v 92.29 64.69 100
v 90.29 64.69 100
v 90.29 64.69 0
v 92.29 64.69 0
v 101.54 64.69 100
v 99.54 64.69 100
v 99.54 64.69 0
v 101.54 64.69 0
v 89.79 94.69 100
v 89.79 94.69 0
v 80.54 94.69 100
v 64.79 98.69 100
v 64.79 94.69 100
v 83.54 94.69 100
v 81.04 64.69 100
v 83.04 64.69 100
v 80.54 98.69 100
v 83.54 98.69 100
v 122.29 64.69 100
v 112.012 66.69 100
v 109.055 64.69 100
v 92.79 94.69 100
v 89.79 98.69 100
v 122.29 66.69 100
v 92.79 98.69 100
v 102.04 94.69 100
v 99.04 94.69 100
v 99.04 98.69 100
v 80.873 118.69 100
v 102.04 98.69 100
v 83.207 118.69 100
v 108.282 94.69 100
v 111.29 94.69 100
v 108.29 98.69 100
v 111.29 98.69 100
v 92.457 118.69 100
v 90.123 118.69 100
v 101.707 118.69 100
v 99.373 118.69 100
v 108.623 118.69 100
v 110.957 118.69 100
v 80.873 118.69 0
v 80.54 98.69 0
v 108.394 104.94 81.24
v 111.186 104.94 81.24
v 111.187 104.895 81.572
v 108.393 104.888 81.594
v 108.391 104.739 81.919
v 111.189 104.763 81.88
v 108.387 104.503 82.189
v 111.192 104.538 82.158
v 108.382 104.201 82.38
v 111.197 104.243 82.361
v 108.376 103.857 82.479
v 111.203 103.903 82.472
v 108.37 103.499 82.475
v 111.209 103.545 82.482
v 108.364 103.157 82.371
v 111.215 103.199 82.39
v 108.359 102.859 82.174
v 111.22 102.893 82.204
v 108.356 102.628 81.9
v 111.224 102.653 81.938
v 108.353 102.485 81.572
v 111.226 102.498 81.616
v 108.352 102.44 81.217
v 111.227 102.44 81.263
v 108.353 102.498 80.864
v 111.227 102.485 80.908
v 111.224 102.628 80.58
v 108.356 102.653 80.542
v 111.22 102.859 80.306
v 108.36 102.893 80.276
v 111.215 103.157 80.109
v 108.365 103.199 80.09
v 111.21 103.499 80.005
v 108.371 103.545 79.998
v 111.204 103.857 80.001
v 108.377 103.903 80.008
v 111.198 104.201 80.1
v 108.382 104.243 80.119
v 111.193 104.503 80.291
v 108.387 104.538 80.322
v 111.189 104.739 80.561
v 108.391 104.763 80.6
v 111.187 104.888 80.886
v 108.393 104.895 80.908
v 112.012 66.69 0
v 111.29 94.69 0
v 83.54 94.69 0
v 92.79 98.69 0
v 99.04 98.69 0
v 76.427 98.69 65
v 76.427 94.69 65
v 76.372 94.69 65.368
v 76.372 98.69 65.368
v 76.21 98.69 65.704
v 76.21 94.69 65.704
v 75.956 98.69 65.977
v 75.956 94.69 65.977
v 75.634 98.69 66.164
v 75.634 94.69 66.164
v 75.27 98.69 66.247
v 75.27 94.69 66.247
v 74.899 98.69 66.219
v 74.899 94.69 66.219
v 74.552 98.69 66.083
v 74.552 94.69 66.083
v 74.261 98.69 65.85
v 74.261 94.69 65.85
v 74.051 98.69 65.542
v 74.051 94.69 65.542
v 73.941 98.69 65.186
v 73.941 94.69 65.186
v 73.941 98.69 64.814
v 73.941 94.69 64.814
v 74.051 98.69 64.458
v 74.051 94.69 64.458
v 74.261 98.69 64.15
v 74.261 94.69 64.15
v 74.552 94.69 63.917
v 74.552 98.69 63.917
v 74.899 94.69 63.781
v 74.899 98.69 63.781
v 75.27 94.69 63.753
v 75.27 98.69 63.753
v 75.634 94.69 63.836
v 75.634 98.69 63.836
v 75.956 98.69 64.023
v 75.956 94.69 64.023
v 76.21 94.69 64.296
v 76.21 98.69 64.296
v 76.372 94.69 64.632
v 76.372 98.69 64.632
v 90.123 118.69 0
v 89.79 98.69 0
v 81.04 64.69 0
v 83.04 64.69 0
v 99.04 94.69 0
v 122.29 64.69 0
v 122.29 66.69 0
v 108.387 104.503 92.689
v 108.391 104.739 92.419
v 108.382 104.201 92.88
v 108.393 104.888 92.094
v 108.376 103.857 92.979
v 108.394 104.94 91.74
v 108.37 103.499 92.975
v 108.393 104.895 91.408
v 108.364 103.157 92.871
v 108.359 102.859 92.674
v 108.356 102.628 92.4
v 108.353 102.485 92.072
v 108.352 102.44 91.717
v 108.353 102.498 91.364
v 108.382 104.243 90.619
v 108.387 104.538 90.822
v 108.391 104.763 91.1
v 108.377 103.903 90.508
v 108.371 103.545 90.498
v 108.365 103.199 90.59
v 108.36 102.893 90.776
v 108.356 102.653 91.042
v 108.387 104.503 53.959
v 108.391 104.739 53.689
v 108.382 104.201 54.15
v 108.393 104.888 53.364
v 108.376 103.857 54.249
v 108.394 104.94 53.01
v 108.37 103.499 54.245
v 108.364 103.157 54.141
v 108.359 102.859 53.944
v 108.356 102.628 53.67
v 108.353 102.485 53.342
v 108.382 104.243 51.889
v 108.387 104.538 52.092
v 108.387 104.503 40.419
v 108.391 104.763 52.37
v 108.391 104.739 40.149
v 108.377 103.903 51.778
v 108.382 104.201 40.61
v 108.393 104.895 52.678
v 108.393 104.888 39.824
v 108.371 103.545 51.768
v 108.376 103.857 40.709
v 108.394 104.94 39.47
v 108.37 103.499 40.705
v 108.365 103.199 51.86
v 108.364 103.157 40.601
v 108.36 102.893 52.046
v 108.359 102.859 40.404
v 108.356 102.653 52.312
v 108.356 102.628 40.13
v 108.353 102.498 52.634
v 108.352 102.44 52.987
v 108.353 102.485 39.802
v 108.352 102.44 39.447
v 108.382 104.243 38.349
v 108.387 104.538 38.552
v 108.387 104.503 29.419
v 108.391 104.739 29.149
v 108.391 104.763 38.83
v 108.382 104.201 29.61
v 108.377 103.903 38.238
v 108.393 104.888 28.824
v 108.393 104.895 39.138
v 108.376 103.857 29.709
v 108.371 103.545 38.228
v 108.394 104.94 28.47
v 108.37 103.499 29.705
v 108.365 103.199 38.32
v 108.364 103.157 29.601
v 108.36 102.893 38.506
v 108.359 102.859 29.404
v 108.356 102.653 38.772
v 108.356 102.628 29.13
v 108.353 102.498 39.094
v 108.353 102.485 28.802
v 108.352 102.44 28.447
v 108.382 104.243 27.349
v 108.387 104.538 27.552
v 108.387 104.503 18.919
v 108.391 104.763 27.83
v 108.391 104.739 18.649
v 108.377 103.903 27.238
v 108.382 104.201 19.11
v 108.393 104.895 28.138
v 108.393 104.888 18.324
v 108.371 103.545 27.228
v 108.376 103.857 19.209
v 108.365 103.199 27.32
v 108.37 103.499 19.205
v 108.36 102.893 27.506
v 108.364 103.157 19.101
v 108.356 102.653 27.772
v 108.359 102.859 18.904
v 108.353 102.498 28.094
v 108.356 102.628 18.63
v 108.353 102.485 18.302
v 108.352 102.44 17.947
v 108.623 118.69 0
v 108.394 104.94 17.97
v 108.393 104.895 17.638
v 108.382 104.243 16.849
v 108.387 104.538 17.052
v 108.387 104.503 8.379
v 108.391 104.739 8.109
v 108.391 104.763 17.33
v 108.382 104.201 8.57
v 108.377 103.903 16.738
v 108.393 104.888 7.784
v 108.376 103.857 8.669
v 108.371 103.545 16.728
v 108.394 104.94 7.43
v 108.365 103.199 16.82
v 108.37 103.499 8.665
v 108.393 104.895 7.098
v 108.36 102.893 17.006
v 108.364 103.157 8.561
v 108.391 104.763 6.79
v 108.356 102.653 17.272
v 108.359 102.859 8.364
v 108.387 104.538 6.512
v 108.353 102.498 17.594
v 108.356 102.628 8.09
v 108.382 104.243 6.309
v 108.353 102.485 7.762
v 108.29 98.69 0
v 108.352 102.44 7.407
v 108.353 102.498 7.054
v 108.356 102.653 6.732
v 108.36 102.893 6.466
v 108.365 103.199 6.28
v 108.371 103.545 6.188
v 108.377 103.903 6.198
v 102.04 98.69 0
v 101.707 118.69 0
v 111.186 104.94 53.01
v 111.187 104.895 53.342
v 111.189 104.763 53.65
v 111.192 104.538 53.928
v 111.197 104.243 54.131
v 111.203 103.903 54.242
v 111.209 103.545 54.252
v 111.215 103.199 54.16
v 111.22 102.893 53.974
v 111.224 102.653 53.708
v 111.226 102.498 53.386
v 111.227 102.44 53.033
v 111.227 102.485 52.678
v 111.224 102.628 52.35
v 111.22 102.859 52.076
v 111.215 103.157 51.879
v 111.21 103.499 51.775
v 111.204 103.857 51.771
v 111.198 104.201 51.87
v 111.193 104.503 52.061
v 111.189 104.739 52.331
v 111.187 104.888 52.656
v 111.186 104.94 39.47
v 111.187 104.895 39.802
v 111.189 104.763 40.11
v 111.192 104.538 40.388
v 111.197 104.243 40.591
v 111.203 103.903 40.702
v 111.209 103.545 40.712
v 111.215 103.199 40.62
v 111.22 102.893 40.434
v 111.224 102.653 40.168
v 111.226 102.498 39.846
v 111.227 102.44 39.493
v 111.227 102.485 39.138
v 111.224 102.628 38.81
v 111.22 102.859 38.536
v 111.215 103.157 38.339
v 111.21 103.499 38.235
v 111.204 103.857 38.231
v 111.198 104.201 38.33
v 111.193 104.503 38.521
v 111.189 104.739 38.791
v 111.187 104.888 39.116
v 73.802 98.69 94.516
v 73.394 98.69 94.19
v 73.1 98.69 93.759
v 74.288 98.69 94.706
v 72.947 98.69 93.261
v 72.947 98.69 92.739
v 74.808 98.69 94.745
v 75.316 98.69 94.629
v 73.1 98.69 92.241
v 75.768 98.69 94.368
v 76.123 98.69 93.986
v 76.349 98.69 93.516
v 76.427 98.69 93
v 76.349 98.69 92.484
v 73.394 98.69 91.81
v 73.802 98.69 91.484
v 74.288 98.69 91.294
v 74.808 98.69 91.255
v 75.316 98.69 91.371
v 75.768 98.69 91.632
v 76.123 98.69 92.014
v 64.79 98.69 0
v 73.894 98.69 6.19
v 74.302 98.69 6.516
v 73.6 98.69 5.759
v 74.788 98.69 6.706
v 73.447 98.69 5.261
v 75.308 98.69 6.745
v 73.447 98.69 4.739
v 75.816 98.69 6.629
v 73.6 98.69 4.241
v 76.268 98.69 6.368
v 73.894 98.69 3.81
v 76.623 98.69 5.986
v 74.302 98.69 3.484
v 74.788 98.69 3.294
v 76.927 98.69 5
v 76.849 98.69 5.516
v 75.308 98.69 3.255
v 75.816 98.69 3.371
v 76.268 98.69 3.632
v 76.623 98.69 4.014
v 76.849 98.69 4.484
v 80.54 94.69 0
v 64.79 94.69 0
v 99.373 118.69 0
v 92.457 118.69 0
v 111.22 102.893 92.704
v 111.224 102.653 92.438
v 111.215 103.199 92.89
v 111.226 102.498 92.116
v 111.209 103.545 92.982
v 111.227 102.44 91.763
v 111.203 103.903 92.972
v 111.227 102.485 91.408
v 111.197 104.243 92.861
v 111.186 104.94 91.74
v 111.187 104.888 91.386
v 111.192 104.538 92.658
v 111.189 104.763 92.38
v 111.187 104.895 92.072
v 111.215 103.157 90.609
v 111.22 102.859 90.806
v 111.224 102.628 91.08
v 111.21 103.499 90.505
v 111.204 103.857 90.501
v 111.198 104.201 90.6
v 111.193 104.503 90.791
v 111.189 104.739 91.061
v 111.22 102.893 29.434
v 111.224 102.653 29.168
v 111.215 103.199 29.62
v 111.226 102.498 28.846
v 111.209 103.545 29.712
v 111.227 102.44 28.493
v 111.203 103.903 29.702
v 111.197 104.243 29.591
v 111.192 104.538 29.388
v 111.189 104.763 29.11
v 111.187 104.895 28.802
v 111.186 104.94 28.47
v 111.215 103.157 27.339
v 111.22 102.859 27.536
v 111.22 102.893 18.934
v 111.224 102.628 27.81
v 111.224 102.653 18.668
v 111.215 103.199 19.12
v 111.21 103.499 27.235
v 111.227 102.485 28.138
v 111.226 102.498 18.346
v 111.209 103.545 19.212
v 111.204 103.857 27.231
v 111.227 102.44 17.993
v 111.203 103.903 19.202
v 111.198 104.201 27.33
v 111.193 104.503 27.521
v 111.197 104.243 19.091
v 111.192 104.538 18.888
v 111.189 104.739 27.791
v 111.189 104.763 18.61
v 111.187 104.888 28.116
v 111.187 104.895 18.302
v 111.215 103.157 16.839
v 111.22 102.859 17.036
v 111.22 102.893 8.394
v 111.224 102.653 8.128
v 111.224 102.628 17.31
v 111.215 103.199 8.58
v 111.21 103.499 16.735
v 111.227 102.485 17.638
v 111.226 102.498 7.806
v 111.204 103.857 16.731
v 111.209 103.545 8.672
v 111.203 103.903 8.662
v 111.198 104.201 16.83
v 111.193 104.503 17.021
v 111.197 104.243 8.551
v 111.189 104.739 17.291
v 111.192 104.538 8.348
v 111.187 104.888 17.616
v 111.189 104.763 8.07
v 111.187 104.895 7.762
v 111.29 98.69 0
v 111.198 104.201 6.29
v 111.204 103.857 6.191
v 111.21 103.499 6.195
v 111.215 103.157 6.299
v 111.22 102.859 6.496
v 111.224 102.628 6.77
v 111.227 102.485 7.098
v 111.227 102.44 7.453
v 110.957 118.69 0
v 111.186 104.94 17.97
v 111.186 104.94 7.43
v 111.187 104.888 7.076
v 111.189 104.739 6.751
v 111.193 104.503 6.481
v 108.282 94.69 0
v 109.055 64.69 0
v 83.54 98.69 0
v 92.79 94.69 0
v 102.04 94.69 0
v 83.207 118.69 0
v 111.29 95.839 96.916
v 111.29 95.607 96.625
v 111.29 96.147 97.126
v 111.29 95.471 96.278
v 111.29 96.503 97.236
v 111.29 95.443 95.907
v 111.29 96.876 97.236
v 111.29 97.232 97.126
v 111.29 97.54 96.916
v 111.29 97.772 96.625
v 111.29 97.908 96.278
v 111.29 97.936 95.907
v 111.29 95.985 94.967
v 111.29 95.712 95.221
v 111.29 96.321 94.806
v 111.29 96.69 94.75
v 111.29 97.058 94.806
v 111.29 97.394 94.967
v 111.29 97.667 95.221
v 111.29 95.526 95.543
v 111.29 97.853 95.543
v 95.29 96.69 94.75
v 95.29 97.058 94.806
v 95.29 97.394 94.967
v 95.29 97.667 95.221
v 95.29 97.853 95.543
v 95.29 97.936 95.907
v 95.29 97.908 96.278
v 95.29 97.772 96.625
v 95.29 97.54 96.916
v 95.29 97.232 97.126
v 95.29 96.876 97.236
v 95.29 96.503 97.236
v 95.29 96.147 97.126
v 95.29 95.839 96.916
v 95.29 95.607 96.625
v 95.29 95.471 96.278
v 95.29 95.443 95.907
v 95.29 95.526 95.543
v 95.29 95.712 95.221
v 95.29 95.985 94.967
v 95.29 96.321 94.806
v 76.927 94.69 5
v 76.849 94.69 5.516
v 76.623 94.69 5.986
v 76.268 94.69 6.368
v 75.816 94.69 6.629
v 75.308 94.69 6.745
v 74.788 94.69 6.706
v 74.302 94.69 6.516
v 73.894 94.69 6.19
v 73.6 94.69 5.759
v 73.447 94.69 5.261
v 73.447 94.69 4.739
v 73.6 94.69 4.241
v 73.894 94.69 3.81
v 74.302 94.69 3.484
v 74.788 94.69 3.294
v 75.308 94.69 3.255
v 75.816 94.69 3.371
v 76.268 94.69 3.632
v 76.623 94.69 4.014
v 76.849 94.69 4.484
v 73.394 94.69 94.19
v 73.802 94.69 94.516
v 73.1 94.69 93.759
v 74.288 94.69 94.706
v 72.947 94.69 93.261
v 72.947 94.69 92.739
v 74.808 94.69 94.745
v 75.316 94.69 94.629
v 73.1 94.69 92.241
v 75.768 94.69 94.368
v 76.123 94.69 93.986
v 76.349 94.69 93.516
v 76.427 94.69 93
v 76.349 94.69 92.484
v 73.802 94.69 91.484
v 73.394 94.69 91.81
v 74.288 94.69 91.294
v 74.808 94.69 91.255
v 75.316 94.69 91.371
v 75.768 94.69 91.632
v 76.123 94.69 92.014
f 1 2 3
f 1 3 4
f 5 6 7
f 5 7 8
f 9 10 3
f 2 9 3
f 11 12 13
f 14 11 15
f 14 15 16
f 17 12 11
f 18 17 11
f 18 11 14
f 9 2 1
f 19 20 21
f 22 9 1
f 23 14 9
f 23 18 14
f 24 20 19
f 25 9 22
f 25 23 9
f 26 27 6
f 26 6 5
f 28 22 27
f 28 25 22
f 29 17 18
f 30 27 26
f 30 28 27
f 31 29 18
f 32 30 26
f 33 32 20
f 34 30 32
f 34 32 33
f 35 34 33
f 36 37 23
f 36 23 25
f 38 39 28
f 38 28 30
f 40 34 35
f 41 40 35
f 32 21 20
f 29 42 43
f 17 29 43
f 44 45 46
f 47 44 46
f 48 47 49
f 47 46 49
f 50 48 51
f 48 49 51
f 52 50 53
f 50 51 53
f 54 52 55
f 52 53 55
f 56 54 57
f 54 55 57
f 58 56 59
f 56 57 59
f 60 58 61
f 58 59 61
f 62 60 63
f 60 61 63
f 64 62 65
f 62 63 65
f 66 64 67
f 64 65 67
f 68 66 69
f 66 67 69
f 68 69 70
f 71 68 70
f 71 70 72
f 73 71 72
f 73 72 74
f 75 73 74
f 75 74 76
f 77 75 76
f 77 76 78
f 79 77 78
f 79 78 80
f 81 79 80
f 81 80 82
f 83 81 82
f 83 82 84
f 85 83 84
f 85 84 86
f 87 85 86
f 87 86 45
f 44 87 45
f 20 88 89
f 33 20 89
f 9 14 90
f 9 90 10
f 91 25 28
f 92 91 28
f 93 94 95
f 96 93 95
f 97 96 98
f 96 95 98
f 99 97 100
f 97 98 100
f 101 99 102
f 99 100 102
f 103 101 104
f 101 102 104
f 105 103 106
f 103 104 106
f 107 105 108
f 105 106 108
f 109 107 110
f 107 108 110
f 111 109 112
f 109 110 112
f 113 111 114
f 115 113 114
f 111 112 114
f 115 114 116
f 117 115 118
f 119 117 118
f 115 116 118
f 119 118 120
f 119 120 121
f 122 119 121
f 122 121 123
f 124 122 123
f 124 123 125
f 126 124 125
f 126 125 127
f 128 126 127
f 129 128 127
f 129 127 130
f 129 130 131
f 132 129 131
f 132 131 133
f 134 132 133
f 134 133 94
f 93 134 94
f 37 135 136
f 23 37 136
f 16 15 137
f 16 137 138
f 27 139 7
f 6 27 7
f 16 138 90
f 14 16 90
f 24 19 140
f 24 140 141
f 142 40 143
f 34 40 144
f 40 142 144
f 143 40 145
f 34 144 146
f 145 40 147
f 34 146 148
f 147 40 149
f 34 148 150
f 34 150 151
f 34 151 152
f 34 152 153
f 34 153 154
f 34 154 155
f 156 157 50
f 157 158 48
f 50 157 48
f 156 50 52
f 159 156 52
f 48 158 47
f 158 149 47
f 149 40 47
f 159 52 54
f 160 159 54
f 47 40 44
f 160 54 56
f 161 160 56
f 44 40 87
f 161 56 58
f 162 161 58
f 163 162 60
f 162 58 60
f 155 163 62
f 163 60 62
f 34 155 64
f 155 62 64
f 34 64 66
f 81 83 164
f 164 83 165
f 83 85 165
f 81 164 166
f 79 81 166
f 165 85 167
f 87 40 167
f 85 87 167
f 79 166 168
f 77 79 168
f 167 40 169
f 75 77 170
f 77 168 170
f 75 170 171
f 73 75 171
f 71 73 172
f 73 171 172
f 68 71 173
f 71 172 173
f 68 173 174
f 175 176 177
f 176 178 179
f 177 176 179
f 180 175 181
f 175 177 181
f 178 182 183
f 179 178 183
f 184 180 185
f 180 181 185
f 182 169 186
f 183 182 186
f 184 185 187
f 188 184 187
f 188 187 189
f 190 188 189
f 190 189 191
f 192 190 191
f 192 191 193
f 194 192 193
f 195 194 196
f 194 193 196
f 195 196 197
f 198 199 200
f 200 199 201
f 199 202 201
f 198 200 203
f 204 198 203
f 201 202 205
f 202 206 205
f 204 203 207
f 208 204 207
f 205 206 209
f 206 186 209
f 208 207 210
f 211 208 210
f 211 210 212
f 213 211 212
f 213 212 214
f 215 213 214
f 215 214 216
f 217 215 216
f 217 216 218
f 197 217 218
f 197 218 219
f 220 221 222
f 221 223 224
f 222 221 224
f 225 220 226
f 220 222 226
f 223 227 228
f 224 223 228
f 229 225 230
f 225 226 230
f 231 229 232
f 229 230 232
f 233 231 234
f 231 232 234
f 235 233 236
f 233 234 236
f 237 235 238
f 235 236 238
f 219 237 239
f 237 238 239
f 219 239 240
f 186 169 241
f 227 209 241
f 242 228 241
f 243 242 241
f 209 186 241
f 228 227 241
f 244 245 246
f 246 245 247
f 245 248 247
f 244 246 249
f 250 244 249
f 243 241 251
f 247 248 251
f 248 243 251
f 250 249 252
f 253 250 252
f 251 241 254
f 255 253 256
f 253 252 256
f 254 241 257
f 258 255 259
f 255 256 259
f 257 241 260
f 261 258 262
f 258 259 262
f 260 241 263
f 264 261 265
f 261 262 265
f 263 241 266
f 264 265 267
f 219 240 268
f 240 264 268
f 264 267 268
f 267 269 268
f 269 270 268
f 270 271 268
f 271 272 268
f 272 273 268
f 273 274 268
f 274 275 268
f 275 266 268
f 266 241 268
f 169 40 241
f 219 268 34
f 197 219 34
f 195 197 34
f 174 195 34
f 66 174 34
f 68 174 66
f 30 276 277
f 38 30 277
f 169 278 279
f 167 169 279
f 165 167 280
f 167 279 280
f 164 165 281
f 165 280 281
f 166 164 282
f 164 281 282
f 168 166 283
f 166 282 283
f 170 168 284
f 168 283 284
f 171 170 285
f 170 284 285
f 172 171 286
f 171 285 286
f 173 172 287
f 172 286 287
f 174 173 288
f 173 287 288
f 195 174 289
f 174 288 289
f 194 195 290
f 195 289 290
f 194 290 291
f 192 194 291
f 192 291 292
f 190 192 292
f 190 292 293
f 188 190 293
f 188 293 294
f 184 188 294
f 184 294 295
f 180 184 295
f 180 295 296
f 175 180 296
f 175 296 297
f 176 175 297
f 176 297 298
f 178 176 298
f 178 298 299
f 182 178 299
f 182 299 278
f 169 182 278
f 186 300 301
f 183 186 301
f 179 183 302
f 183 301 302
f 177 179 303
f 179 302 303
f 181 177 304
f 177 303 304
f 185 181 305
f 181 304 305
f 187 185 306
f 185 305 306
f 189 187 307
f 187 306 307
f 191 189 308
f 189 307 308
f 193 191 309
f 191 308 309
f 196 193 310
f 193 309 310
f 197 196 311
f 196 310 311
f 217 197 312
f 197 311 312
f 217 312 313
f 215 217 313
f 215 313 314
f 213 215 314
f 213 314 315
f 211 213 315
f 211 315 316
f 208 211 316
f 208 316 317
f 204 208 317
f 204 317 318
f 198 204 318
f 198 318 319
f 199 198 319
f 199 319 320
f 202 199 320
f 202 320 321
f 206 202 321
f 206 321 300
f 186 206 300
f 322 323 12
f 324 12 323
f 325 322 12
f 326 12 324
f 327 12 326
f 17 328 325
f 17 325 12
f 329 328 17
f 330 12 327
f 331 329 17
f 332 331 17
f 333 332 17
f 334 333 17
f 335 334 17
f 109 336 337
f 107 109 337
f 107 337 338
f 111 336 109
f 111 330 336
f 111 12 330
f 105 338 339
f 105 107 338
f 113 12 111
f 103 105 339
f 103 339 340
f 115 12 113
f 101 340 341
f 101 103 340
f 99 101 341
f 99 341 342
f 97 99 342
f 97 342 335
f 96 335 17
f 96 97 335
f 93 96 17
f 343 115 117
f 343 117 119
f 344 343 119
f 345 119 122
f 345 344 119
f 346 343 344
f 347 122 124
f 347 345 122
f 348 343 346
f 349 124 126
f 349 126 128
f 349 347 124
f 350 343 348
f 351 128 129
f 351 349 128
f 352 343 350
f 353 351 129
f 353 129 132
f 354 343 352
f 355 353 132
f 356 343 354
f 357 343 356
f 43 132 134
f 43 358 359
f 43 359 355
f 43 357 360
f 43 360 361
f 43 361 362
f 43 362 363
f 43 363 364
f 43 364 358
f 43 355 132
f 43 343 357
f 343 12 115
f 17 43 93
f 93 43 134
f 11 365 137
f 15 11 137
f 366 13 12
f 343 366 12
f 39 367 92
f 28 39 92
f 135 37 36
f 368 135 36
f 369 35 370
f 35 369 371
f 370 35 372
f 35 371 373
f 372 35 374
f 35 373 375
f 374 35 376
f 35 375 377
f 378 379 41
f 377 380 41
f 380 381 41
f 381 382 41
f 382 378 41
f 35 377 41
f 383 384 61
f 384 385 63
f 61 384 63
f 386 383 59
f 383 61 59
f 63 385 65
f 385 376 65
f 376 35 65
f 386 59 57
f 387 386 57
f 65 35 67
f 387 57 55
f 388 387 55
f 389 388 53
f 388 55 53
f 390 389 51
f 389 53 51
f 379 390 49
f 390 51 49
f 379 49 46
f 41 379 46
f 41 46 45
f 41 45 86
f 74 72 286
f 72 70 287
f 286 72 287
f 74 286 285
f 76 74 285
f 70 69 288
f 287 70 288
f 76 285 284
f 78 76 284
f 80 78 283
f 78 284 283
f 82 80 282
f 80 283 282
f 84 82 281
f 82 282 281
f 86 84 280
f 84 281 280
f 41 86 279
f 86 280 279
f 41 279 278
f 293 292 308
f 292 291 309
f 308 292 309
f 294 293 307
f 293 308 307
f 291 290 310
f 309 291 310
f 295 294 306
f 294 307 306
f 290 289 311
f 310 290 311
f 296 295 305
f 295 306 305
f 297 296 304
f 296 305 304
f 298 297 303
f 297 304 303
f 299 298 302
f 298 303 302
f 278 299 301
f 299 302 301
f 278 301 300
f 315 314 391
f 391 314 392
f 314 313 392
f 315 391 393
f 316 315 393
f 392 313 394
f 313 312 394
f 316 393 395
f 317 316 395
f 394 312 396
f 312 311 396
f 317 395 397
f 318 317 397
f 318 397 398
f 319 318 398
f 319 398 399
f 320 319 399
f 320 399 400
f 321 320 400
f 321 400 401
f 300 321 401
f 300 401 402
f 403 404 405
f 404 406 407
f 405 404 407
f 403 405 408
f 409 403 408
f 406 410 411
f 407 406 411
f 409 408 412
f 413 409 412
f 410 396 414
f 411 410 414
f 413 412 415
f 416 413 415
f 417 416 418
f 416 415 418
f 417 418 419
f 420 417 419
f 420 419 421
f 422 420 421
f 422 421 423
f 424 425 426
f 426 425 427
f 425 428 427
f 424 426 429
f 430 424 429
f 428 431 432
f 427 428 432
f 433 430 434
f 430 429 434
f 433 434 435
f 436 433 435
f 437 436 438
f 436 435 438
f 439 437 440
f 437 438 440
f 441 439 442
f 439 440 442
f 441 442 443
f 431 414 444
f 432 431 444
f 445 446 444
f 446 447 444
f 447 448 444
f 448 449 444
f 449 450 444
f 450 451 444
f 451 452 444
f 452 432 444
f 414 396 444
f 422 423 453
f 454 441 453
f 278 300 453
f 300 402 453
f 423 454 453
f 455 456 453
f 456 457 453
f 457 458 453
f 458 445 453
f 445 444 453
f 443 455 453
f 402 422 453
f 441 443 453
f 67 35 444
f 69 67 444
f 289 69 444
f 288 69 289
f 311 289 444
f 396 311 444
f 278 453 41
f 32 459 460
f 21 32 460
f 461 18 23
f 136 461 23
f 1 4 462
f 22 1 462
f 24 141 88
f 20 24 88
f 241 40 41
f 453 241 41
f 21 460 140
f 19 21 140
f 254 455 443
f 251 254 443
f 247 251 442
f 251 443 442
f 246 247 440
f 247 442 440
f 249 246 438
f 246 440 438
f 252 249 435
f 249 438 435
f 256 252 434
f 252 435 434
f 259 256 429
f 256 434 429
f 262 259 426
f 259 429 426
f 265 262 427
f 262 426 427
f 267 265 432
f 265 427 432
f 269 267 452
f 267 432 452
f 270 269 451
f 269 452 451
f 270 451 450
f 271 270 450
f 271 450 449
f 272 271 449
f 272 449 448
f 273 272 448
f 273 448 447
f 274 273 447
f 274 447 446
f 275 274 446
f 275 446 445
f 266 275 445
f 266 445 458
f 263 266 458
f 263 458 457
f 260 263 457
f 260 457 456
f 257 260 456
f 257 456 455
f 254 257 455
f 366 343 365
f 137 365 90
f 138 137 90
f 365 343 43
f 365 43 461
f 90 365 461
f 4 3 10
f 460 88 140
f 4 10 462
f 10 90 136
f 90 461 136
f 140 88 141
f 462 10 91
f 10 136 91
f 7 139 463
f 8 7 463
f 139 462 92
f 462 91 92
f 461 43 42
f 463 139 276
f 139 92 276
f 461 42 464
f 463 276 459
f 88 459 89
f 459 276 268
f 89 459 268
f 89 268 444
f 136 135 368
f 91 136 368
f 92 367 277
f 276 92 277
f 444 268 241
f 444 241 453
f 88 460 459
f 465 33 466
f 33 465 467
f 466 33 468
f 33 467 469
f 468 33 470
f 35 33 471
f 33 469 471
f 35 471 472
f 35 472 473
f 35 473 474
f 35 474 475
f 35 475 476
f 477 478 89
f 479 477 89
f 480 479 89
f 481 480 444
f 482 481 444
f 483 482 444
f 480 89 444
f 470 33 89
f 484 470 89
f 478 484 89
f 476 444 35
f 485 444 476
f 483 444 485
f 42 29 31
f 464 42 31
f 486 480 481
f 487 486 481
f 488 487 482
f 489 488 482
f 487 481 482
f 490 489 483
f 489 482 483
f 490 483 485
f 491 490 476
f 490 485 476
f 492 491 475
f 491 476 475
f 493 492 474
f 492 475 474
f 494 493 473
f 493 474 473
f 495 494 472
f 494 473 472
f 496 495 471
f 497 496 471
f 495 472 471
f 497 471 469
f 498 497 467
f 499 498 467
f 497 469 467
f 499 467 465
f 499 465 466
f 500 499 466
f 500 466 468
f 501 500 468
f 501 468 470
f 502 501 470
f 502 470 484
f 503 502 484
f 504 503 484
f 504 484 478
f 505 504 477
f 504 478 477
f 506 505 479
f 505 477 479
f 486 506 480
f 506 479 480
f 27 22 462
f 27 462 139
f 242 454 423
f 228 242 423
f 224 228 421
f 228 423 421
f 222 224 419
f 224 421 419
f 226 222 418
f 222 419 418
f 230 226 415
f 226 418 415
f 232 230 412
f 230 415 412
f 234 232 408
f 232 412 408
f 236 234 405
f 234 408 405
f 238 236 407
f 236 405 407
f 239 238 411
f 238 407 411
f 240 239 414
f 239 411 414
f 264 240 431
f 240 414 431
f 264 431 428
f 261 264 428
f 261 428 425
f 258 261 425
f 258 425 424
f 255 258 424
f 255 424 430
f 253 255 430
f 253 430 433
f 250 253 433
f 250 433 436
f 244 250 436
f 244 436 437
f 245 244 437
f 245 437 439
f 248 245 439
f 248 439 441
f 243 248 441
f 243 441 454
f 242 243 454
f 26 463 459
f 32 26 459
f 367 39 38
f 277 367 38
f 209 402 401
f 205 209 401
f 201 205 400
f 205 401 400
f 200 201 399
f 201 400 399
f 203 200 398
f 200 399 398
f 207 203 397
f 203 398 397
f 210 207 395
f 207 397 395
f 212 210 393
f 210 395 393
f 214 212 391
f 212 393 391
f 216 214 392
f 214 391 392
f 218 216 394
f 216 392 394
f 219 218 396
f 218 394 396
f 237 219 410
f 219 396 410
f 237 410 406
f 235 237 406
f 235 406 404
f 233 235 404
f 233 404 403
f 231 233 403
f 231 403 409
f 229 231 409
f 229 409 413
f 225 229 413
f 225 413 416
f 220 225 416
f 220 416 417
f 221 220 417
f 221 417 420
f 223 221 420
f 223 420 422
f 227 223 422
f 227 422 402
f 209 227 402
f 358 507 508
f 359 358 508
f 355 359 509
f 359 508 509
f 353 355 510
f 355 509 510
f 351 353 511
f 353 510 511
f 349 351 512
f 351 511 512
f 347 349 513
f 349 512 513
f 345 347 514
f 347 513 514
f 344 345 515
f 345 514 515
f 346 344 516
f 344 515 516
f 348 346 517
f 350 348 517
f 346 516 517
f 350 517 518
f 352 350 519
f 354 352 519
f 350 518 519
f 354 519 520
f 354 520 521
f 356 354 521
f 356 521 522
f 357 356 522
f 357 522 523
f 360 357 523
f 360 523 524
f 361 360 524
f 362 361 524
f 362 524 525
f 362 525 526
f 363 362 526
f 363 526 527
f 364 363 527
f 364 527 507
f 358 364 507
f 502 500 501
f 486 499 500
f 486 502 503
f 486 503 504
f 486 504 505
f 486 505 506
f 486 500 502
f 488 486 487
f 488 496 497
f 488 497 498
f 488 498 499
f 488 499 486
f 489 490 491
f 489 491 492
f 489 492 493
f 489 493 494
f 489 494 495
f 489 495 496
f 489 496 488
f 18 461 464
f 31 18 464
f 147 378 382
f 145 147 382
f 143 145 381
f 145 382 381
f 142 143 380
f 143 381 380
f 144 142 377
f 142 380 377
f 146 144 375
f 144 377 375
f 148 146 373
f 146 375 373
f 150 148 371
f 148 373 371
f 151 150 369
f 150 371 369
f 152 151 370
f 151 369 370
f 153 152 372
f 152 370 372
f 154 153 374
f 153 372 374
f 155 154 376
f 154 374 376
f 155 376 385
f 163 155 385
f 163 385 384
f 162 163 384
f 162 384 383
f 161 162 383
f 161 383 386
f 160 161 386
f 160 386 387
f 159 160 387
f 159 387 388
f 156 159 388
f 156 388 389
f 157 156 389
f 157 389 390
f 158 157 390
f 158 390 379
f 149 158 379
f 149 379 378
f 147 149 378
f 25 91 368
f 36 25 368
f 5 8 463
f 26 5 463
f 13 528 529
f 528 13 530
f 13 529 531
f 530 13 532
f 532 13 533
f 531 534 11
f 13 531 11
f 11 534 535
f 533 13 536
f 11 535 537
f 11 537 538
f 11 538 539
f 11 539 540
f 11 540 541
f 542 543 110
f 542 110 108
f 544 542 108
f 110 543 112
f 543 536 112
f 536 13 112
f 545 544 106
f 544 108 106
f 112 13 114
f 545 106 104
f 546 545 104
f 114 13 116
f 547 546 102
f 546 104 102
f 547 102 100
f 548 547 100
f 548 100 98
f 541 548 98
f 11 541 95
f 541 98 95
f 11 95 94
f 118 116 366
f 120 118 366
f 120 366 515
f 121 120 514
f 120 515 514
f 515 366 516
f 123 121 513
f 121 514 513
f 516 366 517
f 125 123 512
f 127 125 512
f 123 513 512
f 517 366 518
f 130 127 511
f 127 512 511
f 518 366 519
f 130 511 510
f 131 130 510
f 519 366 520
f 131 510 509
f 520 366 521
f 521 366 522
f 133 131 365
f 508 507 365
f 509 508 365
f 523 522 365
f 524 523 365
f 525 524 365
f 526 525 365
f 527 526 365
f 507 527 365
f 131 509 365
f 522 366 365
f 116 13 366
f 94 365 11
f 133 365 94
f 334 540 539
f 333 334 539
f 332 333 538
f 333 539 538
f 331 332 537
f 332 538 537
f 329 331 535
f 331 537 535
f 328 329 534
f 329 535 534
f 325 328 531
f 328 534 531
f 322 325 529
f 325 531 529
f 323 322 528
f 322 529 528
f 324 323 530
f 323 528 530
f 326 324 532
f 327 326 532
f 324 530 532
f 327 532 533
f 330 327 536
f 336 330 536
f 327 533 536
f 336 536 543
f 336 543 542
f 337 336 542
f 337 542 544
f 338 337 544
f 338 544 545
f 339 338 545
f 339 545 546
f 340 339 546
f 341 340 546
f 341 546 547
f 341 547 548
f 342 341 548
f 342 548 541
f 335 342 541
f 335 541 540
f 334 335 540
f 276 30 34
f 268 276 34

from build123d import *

# Parameters (mm, degrees)
SKICA1_W                 = 93
SKICA1_H                 = 4
P_IDAT_VYSUNUT_M1_DEPTH  = 100
SKICA2_W                 = 121.490565888
SKICA2_H                 = 20.366839506
ODEBRAT_VYSUNUT_M1_DEPTH = 204.75436619
SKICA3_W                 = 67.97848113
SKICA3_H                 = 83.569638829
ODEBRAT_VYSUNUT_M2_DEPTH = 198.590610741
SKICA4_R                 = 1.25
ODEBRAT_VYSUNUT_M3_DEPTH = 5
SKICA5_R                 = 1.25
ODEBRAT_VYSUNUT_M4_DEPTH = 16
SKICA6_R                 = 1.25
ODEBRAT_VYSUNUT_M5_DEPTH = 5
SKICA7_R                 = 1.75
ODEBRAT_VYSUNUT_M6_DEPTH = 10


with BuildPart() as part:
    # Skica1 → Přidat vysunutím1 (new body)
    with BuildSketch(Plane.XY):
        Polygon((83.039921415, 64.689614429), (83.539921415, 94.689614429), (80.539921415, 94.689614429), (81.039921415, 64.689614429), align=None)
        Polygon((92.289921415, 64.689614429), (92.789921415, 94.689614429), (89.789921415, 94.689614429), (90.289921415, 64.689614429), align=None)
        Polygon((101.539921415, 64.689614429), (102.039921415, 94.689614429), (99.039921415, 94.689614429), (99.539921415, 64.689614429), align=None)
        Polygon((112.011784527, 66.689614429), (111.289921415, 94.689614429), (108.281882654, 94.689614429), (109.055307417, 64.689614429), (122.289921415, 64.689614429), (122.289921415, 66.689614429), align=None)
        Polygon((108.289921415, 98.689614429), (111.289921415, 98.689614429), (110.789921415, 128.689614429), (108.789921415, 128.689614429), align=None)
        Polygon((99.039921415, 98.689614429), (102.039921415, 98.689614429), (101.539921415, 128.689614429), (99.539921415, 128.689614429), align=None)
        Polygon((89.789921415, 98.689614429), (92.789921415, 98.689614429), (92.289921415, 128.689614429), (90.289921415, 128.689614429), align=None)
        Polygon((80.539921415, 98.689614429), (83.539921415, 98.689614429), (83.039921415, 128.689614429), (81.039921415, 128.689614429), align=None)
        with Locations((64.789921415, 96.689614429)):
            Rectangle(SKICA1_W, SKICA1_H)
        Polygon((27.539921415, 98.689614429), (30.539921415, 98.689614429), (30.039921415, 128.689614429), (28.039921415, 128.689614429), align=None)
        Polygon((36.789921415, 98.689614429), (39.789921415, 98.689614429), (39.289921415, 128.689614429), (37.289921415, 128.689614429), align=None)
        Polygon((46.039921415, 98.689614429), (49.039921415, 98.689614429), (48.539921415, 128.689614429), (46.539921415, 128.689614429), align=None)
        Polygon((18.289921415, 98.689614429), (21.289921415, 98.689614429), (20.789921415, 128.689614429), (18.789921415, 128.689614429), align=None)
        Polygon((20.524535413, 64.689614429), (21.297960175, 94.689614429), (18.289921415, 94.689614429), (17.568058303, 66.689614429), (7.289921415, 66.689614429), (7.289921415, 64.689614429), align=None)
        Polygon((30.039921415, 64.689614429), (30.539921415, 94.689614429), (27.539921415, 94.689614429), (28.039921415, 64.689614429), align=None)
        Polygon((39.289921415, 64.689614429), (39.789921415, 94.689614429), (36.789921415, 94.689614429), (37.289921415, 64.689614429), align=None)
        Polygon((48.539921415, 64.689614429), (49.039921415, 94.689614429), (46.039921415, 94.689614429), (46.539921415, 64.689614429), align=None)
    extrude(amount=P_IDAT_VYSUNUT_M1_DEPTH)

    # Skica2 → Odebrat vysunutím1 (cut, through all)
    with BuildSketch(Plane.XY.offset(100)):
        with Locations((69.111954217, 128.873034182)):
            Rectangle(SKICA2_W, SKICA2_H)
    extrude(amount=-ODEBRAT_VYSUNUT_M1_DEPTH, mode=Mode.SUBTRACT)

    # Skica3 → Odebrat vysunutím2 (cut, through all)
    with BuildSketch(Plane.XY.offset(100)):
        with Locations((30.80068085, 79.614929898)):
            Rectangle(SKICA3_W, SKICA3_H)
    extrude(amount=-ODEBRAT_VYSUNUT_M2_DEPTH, mode=Mode.SUBTRACT)

    # Skica4 → Odebrat vysunutím3 (cut)
    with BuildSketch(Plane(origin=(111.289921415, 0, 0), x_dir=(0, 0, -1), z_dir=(1, 0, 0))):
        with Locations(Location((-91.74, 103.689614429, 0), (0, 0, 90))):
            Circle(SKICA4_R)
        with Locations(Location((-81.24, 103.689614429, 0), (0, 0, 90))):
            Circle(SKICA4_R)
        with Locations(Location((-53.01, 103.689614429, 0), (0, 0, 90))):
            Circle(SKICA4_R)
        with Locations(Location((-28.47, 103.689614429, 0), (0, 0, 90))):
            Circle(SKICA4_R)
        with Locations(Location((-17.97, 103.689614429, 0), (0, 0, 90))):
            Circle(SKICA4_R)
        with Locations(Location((-7.43, 103.689614429, 0), (0, 0, 90))):
            Circle(SKICA4_R)
        with Locations(Location((-39.47, 103.689614429, 0), (0, 0, 90))):
            Circle(SKICA4_R)
    extrude(amount=-ODEBRAT_VYSUNUT_M3_DEPTH, mode=Mode.SUBTRACT)

    # Skica5 → Odebrat vysunutím4 (cut)
    with BuildSketch(Plane(origin=(111.289921415, 0, 0), x_dir=(0, 0, -1), z_dir=(1, 0, 0))):
        with Locations((-96, 96.689614429)):
            Circle(SKICA5_R)
    extrude(amount=-ODEBRAT_VYSUNUT_M4_DEPTH, mode=Mode.SUBTRACT)

    # Skica6 → Odebrat vysunutím5 (cut)
    with BuildSketch(Plane.XZ.offset(-94.689614429)):
        with Locations((74.677082764, 93)):
            Circle(SKICA6_R)
        with Locations((75.177082764, 5)):
            Circle(SKICA6_R)
        with Locations((75.177082764, 65)):
            Circle(SKICA6_R)
    extrude(amount=-ODEBRAT_VYSUNUT_M5_DEPTH, mode=Mode.SUBTRACT)

    # Skica7 → Odebrat vysunutím6 (cut)
    with BuildSketch(Plane.XZ.offset(-94.689614429)):
        with Locations((75.177082764, 5)):
            Circle(SKICA7_R)
        with Locations((74.677082764, 93)):
            Circle(SKICA7_R)
    extrude(amount=-ODEBRAT_VYSUNUT_M6_DEPTH, mode=Mode.SUBTRACT)


solid = part.part
